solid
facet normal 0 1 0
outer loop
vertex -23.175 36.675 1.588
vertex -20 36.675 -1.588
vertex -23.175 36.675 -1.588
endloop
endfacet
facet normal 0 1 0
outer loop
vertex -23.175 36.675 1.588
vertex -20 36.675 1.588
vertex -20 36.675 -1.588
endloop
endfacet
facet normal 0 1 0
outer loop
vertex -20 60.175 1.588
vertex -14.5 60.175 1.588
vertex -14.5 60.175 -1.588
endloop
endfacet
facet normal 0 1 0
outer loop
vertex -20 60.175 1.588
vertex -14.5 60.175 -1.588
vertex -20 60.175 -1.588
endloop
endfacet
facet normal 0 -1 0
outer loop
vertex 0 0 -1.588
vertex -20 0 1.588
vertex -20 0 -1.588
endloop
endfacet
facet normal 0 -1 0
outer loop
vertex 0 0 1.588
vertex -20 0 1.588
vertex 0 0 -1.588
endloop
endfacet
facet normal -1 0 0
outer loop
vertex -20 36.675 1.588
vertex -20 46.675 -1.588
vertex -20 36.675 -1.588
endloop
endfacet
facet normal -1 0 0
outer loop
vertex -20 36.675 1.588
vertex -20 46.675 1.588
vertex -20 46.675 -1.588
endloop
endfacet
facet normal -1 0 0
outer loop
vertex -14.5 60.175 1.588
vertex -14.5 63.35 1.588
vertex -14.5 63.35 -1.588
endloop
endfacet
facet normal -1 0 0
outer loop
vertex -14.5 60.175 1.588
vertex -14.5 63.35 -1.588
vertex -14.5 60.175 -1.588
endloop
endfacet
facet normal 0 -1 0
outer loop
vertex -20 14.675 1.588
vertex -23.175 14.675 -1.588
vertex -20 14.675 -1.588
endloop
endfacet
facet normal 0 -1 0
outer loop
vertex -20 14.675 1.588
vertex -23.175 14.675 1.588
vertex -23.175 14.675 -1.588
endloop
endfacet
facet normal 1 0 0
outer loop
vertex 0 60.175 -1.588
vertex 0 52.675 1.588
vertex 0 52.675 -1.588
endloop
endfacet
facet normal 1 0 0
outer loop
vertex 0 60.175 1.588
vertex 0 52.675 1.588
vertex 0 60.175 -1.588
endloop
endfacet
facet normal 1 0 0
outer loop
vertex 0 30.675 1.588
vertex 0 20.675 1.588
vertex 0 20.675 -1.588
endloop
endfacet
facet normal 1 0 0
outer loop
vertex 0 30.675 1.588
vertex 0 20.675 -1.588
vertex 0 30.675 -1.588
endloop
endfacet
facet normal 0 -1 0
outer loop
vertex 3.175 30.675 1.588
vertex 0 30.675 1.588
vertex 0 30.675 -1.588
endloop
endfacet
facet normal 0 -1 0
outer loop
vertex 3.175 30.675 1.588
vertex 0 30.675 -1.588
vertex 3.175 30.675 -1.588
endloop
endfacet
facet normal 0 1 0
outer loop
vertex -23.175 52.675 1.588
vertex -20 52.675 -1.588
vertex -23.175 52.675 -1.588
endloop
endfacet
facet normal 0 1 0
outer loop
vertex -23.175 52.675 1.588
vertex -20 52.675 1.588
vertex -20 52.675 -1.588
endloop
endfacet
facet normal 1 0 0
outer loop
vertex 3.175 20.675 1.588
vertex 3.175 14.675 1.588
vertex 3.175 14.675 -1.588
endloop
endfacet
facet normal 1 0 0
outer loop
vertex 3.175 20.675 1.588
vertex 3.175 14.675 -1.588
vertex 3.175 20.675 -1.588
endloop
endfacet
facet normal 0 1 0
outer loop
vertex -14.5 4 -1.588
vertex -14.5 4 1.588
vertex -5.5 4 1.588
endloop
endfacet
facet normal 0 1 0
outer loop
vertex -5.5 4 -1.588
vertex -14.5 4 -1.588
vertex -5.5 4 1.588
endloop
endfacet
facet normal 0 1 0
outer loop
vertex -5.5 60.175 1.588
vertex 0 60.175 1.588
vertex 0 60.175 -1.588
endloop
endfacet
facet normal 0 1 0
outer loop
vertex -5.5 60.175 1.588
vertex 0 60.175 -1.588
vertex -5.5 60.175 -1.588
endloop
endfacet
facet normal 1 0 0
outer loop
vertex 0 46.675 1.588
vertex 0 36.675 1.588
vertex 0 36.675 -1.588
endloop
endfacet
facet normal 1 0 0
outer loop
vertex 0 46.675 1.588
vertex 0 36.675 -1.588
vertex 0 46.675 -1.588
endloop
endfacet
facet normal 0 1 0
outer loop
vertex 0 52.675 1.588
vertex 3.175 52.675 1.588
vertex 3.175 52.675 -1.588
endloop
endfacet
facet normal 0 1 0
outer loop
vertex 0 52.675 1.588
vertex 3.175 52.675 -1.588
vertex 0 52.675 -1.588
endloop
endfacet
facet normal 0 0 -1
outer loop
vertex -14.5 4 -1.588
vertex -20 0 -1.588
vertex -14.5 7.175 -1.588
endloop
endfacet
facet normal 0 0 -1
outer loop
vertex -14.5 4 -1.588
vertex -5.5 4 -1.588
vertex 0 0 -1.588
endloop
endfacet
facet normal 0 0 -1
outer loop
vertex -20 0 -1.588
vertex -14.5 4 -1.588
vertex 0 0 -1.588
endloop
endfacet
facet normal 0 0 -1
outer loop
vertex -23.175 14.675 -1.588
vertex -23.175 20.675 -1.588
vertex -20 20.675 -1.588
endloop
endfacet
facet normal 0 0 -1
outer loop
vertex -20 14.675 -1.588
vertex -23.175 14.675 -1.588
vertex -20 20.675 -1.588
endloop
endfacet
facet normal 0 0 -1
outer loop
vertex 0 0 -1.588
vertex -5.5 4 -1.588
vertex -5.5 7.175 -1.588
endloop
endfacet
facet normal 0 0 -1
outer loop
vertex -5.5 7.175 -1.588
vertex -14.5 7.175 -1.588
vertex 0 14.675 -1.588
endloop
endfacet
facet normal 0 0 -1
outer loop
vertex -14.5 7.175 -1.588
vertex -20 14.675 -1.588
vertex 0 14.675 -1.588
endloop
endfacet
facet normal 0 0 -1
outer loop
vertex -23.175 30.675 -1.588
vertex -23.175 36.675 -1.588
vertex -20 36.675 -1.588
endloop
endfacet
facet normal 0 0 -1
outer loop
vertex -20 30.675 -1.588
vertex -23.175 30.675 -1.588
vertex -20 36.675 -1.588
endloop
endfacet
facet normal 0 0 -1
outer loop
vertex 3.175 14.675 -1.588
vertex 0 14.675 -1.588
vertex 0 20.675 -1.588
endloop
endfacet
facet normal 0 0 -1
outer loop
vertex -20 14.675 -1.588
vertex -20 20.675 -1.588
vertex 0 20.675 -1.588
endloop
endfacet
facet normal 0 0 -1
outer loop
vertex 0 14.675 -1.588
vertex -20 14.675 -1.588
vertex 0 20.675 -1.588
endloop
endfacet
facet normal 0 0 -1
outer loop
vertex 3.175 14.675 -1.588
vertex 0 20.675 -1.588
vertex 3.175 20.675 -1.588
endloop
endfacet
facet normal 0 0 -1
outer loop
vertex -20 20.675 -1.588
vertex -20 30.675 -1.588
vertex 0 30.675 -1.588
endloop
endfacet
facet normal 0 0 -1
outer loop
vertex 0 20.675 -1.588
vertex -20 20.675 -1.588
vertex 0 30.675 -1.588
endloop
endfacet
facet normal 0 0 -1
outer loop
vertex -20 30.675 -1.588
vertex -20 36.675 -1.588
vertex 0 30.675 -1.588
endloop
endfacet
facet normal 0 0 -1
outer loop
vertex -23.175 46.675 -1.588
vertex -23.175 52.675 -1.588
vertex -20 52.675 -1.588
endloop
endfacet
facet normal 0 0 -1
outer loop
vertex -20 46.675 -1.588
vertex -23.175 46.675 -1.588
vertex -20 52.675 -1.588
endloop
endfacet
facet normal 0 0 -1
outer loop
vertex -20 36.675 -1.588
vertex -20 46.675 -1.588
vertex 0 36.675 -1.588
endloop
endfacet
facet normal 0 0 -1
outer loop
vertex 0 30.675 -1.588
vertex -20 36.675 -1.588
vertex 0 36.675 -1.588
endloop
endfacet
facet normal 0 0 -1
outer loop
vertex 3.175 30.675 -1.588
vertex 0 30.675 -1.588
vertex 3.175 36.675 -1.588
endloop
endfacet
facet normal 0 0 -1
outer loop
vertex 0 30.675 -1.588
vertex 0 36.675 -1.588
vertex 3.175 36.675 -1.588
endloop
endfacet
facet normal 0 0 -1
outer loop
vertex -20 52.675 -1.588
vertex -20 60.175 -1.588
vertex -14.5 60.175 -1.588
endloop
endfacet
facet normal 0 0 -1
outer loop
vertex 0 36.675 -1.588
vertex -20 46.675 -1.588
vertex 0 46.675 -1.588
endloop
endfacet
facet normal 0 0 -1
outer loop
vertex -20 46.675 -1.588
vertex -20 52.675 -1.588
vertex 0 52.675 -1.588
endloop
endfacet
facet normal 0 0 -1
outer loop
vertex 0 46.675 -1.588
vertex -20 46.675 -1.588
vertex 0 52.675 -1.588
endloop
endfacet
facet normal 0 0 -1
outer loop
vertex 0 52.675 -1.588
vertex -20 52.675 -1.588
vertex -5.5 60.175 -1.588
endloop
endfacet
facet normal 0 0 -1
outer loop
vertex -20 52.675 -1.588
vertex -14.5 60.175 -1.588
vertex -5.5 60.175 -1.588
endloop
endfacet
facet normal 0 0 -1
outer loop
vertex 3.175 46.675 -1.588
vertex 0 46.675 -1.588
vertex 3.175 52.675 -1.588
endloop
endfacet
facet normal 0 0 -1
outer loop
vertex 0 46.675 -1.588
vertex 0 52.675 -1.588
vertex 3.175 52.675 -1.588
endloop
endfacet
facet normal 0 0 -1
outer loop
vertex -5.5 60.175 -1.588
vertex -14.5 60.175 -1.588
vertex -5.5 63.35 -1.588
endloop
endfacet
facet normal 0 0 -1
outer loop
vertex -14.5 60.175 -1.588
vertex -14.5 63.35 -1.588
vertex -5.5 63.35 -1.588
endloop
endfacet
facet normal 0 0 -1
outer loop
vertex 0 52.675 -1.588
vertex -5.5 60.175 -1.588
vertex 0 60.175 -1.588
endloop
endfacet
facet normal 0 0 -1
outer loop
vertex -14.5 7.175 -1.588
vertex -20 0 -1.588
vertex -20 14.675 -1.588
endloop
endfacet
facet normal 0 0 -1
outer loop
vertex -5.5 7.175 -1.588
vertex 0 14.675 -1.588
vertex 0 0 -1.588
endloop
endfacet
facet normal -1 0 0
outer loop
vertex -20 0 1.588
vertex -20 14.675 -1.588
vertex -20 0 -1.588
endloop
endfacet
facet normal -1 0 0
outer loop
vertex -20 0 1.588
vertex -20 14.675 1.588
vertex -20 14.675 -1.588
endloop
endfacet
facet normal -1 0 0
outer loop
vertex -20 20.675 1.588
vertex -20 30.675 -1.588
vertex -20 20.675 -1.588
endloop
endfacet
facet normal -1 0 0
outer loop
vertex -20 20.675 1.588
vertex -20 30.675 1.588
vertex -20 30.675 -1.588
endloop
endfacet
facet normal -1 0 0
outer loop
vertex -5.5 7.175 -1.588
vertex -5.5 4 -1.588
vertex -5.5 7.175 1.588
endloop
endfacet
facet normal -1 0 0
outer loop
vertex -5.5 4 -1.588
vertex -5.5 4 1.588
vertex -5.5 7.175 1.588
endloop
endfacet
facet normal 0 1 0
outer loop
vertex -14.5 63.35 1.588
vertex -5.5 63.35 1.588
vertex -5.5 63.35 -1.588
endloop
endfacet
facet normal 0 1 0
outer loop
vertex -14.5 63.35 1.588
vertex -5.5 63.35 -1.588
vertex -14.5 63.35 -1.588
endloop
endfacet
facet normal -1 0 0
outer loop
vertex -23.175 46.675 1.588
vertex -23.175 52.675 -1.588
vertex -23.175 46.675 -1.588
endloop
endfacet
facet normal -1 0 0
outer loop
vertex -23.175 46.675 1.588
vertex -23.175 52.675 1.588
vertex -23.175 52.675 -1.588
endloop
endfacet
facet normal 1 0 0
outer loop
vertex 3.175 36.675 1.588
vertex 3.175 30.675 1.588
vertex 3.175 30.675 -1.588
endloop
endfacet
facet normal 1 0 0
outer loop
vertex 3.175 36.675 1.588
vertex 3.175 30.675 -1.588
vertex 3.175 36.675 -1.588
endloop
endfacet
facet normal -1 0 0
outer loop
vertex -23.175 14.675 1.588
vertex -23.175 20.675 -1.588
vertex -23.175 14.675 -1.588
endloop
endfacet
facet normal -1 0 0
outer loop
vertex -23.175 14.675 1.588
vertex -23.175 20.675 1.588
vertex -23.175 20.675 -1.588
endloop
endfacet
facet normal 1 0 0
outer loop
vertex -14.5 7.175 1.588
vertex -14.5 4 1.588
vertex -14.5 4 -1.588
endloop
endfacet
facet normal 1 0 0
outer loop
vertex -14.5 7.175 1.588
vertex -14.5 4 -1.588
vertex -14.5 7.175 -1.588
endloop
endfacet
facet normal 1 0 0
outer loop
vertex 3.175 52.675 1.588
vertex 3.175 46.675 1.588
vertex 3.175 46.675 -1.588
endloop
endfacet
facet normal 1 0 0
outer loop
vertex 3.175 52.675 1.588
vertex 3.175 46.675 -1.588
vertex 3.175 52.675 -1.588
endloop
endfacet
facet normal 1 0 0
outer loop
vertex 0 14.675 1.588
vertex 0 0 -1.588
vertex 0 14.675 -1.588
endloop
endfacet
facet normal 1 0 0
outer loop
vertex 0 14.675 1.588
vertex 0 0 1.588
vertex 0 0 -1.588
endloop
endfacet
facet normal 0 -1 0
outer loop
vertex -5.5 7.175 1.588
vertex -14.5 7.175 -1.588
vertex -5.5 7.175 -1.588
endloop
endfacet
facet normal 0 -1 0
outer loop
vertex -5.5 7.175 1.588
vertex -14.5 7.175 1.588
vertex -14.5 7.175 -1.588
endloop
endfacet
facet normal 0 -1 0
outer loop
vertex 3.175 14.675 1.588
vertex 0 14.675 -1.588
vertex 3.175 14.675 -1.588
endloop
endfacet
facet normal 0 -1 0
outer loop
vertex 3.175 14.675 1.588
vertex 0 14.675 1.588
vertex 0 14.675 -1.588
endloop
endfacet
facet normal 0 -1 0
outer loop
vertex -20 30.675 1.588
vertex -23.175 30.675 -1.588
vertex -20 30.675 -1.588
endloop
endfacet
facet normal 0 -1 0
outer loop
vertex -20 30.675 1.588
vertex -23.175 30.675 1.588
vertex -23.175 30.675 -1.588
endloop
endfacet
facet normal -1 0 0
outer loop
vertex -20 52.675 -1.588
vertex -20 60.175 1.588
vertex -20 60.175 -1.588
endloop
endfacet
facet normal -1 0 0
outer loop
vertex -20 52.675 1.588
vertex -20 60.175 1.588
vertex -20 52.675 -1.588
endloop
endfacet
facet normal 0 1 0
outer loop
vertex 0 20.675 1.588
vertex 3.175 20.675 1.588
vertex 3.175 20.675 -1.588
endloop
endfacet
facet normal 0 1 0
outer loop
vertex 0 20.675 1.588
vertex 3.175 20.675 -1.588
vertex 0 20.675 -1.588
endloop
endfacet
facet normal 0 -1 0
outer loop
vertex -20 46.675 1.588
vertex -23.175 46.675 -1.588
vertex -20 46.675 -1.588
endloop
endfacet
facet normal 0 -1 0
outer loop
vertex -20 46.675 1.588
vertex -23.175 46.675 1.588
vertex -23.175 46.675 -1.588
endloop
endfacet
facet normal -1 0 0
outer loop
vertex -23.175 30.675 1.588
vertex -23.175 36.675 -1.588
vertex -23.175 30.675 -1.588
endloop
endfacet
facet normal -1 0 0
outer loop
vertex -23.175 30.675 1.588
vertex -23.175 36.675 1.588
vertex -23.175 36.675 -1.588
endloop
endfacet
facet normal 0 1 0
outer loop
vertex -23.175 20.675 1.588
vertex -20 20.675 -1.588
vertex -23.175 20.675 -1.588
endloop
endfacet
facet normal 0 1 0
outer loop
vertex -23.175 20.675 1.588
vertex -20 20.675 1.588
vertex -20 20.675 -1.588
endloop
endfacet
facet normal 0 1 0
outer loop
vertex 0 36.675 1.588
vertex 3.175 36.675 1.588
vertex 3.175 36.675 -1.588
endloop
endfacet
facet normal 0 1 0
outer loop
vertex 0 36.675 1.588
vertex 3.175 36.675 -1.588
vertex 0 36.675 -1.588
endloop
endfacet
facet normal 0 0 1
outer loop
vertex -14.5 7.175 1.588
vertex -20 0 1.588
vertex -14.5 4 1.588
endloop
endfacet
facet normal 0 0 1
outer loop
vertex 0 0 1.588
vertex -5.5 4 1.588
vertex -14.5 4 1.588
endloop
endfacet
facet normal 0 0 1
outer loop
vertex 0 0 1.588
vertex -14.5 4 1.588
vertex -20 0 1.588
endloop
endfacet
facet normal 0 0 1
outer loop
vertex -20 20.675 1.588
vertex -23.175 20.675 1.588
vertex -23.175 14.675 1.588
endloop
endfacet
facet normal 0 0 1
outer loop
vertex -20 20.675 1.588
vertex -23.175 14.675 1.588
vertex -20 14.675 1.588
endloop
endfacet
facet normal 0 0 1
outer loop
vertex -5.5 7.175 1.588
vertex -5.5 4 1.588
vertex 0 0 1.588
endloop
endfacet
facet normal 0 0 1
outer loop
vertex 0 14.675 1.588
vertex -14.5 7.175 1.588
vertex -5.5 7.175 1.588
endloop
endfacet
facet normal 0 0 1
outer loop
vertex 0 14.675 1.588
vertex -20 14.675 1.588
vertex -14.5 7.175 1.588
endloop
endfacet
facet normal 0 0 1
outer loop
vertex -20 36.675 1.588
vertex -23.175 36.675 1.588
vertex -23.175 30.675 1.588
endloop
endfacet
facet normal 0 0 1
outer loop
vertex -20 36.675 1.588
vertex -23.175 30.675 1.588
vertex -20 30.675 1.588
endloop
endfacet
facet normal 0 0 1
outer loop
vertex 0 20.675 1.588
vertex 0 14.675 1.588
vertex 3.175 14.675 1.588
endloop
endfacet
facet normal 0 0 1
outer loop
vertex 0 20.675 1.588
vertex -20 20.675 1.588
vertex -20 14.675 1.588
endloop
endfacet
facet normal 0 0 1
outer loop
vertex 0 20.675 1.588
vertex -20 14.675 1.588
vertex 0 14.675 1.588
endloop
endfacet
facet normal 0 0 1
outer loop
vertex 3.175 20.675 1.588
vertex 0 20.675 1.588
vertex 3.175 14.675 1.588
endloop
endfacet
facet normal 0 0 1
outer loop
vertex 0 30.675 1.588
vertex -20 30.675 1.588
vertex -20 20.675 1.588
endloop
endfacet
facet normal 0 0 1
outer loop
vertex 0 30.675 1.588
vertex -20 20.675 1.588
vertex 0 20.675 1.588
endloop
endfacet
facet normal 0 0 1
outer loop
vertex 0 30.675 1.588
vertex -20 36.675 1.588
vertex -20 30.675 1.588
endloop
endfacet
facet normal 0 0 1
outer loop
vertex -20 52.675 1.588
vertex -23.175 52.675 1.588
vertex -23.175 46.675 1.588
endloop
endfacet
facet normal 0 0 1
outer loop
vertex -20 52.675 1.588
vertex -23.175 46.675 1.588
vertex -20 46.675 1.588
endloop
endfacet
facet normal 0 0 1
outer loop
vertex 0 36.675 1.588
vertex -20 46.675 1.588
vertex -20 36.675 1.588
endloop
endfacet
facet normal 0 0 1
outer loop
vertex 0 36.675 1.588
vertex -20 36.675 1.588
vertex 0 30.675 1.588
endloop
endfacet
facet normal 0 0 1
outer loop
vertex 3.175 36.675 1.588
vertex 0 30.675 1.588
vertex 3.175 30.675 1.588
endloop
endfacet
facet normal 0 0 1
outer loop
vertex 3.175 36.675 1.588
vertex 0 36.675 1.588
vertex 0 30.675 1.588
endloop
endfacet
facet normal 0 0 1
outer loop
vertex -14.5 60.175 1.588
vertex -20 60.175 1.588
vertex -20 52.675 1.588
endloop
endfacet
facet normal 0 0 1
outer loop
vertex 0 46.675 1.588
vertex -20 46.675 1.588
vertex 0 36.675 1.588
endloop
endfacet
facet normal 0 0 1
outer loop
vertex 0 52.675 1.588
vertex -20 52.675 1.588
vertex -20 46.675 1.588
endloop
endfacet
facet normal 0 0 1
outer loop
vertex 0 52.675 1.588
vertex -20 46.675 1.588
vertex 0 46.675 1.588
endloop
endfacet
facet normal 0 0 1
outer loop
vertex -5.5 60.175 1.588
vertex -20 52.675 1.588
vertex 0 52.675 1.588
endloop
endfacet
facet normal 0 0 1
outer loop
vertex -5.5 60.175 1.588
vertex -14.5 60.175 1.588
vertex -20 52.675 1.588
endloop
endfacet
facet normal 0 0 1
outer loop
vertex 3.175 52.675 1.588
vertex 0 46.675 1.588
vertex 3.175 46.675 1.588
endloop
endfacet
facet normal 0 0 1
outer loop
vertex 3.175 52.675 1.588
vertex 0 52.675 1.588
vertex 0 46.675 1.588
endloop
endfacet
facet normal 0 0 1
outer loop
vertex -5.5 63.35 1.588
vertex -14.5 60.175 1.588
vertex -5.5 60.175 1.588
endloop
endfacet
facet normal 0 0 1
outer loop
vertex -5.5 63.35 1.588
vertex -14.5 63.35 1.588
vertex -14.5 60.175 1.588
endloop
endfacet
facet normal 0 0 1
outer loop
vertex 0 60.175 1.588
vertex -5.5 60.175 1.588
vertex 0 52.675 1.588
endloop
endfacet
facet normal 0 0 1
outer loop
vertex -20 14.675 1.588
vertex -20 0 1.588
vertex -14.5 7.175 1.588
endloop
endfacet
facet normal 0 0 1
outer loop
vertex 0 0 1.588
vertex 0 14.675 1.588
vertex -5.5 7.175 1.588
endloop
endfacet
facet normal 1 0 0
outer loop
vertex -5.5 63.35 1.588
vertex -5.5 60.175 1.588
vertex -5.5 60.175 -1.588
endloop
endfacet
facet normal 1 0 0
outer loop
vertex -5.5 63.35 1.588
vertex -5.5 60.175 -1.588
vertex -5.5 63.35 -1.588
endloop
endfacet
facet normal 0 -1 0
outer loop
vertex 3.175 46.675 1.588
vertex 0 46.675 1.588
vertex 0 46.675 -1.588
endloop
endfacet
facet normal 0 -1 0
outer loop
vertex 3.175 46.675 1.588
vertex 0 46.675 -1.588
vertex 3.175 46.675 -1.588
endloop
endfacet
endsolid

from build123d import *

# Parameters (mm, degrees)
SKETCH1_W           = 9
SKETCH1_H           = 3.175
BOSS_EXTRUDE2_DEPTH = 1.5875


with BuildPart() as part:
    # Sketch1 → Boss-Extrude2 (new body, symmetric)
    with BuildSketch(Plane.XY):
        Polygon((0, 14.675), (3.175, 14.675), (3.175, 20.675), (0, 20.675), (0, 30.675), (3.175, 30.675), (3.175, 36.675), (0, 36.675), (0, 46.675), (3.175, 46.675), (3.175, 52.675), (0, 52.675), (0, 60.175), (-5.5, 60.175), (-5.5, 63.35), (-14.5, 63.35), (-14.5, 60.175), (-20, 60.175), (-20, 52.675), (-23.175, 52.675), (-23.175, 46.675), (-20, 46.675), (-20, 36.675), (-23.175, 36.675), (-23.175, 30.675), (-20, 30.675), (-20, 20.675), (-23.175, 20.675), (-23.175, 14.675), (-20, 14.675), (-20, 7.175), (-20, 0), (0, 0), (0, 7.175), align=None)
        with Locations((-10, 5.5875)):
            Rectangle(SKETCH1_W, SKETCH1_H, mode=Mode.SUBTRACT)
    extrude(amount=BOSS_EXTRUDE2_DEPTH, both=True)


solid = part.part
